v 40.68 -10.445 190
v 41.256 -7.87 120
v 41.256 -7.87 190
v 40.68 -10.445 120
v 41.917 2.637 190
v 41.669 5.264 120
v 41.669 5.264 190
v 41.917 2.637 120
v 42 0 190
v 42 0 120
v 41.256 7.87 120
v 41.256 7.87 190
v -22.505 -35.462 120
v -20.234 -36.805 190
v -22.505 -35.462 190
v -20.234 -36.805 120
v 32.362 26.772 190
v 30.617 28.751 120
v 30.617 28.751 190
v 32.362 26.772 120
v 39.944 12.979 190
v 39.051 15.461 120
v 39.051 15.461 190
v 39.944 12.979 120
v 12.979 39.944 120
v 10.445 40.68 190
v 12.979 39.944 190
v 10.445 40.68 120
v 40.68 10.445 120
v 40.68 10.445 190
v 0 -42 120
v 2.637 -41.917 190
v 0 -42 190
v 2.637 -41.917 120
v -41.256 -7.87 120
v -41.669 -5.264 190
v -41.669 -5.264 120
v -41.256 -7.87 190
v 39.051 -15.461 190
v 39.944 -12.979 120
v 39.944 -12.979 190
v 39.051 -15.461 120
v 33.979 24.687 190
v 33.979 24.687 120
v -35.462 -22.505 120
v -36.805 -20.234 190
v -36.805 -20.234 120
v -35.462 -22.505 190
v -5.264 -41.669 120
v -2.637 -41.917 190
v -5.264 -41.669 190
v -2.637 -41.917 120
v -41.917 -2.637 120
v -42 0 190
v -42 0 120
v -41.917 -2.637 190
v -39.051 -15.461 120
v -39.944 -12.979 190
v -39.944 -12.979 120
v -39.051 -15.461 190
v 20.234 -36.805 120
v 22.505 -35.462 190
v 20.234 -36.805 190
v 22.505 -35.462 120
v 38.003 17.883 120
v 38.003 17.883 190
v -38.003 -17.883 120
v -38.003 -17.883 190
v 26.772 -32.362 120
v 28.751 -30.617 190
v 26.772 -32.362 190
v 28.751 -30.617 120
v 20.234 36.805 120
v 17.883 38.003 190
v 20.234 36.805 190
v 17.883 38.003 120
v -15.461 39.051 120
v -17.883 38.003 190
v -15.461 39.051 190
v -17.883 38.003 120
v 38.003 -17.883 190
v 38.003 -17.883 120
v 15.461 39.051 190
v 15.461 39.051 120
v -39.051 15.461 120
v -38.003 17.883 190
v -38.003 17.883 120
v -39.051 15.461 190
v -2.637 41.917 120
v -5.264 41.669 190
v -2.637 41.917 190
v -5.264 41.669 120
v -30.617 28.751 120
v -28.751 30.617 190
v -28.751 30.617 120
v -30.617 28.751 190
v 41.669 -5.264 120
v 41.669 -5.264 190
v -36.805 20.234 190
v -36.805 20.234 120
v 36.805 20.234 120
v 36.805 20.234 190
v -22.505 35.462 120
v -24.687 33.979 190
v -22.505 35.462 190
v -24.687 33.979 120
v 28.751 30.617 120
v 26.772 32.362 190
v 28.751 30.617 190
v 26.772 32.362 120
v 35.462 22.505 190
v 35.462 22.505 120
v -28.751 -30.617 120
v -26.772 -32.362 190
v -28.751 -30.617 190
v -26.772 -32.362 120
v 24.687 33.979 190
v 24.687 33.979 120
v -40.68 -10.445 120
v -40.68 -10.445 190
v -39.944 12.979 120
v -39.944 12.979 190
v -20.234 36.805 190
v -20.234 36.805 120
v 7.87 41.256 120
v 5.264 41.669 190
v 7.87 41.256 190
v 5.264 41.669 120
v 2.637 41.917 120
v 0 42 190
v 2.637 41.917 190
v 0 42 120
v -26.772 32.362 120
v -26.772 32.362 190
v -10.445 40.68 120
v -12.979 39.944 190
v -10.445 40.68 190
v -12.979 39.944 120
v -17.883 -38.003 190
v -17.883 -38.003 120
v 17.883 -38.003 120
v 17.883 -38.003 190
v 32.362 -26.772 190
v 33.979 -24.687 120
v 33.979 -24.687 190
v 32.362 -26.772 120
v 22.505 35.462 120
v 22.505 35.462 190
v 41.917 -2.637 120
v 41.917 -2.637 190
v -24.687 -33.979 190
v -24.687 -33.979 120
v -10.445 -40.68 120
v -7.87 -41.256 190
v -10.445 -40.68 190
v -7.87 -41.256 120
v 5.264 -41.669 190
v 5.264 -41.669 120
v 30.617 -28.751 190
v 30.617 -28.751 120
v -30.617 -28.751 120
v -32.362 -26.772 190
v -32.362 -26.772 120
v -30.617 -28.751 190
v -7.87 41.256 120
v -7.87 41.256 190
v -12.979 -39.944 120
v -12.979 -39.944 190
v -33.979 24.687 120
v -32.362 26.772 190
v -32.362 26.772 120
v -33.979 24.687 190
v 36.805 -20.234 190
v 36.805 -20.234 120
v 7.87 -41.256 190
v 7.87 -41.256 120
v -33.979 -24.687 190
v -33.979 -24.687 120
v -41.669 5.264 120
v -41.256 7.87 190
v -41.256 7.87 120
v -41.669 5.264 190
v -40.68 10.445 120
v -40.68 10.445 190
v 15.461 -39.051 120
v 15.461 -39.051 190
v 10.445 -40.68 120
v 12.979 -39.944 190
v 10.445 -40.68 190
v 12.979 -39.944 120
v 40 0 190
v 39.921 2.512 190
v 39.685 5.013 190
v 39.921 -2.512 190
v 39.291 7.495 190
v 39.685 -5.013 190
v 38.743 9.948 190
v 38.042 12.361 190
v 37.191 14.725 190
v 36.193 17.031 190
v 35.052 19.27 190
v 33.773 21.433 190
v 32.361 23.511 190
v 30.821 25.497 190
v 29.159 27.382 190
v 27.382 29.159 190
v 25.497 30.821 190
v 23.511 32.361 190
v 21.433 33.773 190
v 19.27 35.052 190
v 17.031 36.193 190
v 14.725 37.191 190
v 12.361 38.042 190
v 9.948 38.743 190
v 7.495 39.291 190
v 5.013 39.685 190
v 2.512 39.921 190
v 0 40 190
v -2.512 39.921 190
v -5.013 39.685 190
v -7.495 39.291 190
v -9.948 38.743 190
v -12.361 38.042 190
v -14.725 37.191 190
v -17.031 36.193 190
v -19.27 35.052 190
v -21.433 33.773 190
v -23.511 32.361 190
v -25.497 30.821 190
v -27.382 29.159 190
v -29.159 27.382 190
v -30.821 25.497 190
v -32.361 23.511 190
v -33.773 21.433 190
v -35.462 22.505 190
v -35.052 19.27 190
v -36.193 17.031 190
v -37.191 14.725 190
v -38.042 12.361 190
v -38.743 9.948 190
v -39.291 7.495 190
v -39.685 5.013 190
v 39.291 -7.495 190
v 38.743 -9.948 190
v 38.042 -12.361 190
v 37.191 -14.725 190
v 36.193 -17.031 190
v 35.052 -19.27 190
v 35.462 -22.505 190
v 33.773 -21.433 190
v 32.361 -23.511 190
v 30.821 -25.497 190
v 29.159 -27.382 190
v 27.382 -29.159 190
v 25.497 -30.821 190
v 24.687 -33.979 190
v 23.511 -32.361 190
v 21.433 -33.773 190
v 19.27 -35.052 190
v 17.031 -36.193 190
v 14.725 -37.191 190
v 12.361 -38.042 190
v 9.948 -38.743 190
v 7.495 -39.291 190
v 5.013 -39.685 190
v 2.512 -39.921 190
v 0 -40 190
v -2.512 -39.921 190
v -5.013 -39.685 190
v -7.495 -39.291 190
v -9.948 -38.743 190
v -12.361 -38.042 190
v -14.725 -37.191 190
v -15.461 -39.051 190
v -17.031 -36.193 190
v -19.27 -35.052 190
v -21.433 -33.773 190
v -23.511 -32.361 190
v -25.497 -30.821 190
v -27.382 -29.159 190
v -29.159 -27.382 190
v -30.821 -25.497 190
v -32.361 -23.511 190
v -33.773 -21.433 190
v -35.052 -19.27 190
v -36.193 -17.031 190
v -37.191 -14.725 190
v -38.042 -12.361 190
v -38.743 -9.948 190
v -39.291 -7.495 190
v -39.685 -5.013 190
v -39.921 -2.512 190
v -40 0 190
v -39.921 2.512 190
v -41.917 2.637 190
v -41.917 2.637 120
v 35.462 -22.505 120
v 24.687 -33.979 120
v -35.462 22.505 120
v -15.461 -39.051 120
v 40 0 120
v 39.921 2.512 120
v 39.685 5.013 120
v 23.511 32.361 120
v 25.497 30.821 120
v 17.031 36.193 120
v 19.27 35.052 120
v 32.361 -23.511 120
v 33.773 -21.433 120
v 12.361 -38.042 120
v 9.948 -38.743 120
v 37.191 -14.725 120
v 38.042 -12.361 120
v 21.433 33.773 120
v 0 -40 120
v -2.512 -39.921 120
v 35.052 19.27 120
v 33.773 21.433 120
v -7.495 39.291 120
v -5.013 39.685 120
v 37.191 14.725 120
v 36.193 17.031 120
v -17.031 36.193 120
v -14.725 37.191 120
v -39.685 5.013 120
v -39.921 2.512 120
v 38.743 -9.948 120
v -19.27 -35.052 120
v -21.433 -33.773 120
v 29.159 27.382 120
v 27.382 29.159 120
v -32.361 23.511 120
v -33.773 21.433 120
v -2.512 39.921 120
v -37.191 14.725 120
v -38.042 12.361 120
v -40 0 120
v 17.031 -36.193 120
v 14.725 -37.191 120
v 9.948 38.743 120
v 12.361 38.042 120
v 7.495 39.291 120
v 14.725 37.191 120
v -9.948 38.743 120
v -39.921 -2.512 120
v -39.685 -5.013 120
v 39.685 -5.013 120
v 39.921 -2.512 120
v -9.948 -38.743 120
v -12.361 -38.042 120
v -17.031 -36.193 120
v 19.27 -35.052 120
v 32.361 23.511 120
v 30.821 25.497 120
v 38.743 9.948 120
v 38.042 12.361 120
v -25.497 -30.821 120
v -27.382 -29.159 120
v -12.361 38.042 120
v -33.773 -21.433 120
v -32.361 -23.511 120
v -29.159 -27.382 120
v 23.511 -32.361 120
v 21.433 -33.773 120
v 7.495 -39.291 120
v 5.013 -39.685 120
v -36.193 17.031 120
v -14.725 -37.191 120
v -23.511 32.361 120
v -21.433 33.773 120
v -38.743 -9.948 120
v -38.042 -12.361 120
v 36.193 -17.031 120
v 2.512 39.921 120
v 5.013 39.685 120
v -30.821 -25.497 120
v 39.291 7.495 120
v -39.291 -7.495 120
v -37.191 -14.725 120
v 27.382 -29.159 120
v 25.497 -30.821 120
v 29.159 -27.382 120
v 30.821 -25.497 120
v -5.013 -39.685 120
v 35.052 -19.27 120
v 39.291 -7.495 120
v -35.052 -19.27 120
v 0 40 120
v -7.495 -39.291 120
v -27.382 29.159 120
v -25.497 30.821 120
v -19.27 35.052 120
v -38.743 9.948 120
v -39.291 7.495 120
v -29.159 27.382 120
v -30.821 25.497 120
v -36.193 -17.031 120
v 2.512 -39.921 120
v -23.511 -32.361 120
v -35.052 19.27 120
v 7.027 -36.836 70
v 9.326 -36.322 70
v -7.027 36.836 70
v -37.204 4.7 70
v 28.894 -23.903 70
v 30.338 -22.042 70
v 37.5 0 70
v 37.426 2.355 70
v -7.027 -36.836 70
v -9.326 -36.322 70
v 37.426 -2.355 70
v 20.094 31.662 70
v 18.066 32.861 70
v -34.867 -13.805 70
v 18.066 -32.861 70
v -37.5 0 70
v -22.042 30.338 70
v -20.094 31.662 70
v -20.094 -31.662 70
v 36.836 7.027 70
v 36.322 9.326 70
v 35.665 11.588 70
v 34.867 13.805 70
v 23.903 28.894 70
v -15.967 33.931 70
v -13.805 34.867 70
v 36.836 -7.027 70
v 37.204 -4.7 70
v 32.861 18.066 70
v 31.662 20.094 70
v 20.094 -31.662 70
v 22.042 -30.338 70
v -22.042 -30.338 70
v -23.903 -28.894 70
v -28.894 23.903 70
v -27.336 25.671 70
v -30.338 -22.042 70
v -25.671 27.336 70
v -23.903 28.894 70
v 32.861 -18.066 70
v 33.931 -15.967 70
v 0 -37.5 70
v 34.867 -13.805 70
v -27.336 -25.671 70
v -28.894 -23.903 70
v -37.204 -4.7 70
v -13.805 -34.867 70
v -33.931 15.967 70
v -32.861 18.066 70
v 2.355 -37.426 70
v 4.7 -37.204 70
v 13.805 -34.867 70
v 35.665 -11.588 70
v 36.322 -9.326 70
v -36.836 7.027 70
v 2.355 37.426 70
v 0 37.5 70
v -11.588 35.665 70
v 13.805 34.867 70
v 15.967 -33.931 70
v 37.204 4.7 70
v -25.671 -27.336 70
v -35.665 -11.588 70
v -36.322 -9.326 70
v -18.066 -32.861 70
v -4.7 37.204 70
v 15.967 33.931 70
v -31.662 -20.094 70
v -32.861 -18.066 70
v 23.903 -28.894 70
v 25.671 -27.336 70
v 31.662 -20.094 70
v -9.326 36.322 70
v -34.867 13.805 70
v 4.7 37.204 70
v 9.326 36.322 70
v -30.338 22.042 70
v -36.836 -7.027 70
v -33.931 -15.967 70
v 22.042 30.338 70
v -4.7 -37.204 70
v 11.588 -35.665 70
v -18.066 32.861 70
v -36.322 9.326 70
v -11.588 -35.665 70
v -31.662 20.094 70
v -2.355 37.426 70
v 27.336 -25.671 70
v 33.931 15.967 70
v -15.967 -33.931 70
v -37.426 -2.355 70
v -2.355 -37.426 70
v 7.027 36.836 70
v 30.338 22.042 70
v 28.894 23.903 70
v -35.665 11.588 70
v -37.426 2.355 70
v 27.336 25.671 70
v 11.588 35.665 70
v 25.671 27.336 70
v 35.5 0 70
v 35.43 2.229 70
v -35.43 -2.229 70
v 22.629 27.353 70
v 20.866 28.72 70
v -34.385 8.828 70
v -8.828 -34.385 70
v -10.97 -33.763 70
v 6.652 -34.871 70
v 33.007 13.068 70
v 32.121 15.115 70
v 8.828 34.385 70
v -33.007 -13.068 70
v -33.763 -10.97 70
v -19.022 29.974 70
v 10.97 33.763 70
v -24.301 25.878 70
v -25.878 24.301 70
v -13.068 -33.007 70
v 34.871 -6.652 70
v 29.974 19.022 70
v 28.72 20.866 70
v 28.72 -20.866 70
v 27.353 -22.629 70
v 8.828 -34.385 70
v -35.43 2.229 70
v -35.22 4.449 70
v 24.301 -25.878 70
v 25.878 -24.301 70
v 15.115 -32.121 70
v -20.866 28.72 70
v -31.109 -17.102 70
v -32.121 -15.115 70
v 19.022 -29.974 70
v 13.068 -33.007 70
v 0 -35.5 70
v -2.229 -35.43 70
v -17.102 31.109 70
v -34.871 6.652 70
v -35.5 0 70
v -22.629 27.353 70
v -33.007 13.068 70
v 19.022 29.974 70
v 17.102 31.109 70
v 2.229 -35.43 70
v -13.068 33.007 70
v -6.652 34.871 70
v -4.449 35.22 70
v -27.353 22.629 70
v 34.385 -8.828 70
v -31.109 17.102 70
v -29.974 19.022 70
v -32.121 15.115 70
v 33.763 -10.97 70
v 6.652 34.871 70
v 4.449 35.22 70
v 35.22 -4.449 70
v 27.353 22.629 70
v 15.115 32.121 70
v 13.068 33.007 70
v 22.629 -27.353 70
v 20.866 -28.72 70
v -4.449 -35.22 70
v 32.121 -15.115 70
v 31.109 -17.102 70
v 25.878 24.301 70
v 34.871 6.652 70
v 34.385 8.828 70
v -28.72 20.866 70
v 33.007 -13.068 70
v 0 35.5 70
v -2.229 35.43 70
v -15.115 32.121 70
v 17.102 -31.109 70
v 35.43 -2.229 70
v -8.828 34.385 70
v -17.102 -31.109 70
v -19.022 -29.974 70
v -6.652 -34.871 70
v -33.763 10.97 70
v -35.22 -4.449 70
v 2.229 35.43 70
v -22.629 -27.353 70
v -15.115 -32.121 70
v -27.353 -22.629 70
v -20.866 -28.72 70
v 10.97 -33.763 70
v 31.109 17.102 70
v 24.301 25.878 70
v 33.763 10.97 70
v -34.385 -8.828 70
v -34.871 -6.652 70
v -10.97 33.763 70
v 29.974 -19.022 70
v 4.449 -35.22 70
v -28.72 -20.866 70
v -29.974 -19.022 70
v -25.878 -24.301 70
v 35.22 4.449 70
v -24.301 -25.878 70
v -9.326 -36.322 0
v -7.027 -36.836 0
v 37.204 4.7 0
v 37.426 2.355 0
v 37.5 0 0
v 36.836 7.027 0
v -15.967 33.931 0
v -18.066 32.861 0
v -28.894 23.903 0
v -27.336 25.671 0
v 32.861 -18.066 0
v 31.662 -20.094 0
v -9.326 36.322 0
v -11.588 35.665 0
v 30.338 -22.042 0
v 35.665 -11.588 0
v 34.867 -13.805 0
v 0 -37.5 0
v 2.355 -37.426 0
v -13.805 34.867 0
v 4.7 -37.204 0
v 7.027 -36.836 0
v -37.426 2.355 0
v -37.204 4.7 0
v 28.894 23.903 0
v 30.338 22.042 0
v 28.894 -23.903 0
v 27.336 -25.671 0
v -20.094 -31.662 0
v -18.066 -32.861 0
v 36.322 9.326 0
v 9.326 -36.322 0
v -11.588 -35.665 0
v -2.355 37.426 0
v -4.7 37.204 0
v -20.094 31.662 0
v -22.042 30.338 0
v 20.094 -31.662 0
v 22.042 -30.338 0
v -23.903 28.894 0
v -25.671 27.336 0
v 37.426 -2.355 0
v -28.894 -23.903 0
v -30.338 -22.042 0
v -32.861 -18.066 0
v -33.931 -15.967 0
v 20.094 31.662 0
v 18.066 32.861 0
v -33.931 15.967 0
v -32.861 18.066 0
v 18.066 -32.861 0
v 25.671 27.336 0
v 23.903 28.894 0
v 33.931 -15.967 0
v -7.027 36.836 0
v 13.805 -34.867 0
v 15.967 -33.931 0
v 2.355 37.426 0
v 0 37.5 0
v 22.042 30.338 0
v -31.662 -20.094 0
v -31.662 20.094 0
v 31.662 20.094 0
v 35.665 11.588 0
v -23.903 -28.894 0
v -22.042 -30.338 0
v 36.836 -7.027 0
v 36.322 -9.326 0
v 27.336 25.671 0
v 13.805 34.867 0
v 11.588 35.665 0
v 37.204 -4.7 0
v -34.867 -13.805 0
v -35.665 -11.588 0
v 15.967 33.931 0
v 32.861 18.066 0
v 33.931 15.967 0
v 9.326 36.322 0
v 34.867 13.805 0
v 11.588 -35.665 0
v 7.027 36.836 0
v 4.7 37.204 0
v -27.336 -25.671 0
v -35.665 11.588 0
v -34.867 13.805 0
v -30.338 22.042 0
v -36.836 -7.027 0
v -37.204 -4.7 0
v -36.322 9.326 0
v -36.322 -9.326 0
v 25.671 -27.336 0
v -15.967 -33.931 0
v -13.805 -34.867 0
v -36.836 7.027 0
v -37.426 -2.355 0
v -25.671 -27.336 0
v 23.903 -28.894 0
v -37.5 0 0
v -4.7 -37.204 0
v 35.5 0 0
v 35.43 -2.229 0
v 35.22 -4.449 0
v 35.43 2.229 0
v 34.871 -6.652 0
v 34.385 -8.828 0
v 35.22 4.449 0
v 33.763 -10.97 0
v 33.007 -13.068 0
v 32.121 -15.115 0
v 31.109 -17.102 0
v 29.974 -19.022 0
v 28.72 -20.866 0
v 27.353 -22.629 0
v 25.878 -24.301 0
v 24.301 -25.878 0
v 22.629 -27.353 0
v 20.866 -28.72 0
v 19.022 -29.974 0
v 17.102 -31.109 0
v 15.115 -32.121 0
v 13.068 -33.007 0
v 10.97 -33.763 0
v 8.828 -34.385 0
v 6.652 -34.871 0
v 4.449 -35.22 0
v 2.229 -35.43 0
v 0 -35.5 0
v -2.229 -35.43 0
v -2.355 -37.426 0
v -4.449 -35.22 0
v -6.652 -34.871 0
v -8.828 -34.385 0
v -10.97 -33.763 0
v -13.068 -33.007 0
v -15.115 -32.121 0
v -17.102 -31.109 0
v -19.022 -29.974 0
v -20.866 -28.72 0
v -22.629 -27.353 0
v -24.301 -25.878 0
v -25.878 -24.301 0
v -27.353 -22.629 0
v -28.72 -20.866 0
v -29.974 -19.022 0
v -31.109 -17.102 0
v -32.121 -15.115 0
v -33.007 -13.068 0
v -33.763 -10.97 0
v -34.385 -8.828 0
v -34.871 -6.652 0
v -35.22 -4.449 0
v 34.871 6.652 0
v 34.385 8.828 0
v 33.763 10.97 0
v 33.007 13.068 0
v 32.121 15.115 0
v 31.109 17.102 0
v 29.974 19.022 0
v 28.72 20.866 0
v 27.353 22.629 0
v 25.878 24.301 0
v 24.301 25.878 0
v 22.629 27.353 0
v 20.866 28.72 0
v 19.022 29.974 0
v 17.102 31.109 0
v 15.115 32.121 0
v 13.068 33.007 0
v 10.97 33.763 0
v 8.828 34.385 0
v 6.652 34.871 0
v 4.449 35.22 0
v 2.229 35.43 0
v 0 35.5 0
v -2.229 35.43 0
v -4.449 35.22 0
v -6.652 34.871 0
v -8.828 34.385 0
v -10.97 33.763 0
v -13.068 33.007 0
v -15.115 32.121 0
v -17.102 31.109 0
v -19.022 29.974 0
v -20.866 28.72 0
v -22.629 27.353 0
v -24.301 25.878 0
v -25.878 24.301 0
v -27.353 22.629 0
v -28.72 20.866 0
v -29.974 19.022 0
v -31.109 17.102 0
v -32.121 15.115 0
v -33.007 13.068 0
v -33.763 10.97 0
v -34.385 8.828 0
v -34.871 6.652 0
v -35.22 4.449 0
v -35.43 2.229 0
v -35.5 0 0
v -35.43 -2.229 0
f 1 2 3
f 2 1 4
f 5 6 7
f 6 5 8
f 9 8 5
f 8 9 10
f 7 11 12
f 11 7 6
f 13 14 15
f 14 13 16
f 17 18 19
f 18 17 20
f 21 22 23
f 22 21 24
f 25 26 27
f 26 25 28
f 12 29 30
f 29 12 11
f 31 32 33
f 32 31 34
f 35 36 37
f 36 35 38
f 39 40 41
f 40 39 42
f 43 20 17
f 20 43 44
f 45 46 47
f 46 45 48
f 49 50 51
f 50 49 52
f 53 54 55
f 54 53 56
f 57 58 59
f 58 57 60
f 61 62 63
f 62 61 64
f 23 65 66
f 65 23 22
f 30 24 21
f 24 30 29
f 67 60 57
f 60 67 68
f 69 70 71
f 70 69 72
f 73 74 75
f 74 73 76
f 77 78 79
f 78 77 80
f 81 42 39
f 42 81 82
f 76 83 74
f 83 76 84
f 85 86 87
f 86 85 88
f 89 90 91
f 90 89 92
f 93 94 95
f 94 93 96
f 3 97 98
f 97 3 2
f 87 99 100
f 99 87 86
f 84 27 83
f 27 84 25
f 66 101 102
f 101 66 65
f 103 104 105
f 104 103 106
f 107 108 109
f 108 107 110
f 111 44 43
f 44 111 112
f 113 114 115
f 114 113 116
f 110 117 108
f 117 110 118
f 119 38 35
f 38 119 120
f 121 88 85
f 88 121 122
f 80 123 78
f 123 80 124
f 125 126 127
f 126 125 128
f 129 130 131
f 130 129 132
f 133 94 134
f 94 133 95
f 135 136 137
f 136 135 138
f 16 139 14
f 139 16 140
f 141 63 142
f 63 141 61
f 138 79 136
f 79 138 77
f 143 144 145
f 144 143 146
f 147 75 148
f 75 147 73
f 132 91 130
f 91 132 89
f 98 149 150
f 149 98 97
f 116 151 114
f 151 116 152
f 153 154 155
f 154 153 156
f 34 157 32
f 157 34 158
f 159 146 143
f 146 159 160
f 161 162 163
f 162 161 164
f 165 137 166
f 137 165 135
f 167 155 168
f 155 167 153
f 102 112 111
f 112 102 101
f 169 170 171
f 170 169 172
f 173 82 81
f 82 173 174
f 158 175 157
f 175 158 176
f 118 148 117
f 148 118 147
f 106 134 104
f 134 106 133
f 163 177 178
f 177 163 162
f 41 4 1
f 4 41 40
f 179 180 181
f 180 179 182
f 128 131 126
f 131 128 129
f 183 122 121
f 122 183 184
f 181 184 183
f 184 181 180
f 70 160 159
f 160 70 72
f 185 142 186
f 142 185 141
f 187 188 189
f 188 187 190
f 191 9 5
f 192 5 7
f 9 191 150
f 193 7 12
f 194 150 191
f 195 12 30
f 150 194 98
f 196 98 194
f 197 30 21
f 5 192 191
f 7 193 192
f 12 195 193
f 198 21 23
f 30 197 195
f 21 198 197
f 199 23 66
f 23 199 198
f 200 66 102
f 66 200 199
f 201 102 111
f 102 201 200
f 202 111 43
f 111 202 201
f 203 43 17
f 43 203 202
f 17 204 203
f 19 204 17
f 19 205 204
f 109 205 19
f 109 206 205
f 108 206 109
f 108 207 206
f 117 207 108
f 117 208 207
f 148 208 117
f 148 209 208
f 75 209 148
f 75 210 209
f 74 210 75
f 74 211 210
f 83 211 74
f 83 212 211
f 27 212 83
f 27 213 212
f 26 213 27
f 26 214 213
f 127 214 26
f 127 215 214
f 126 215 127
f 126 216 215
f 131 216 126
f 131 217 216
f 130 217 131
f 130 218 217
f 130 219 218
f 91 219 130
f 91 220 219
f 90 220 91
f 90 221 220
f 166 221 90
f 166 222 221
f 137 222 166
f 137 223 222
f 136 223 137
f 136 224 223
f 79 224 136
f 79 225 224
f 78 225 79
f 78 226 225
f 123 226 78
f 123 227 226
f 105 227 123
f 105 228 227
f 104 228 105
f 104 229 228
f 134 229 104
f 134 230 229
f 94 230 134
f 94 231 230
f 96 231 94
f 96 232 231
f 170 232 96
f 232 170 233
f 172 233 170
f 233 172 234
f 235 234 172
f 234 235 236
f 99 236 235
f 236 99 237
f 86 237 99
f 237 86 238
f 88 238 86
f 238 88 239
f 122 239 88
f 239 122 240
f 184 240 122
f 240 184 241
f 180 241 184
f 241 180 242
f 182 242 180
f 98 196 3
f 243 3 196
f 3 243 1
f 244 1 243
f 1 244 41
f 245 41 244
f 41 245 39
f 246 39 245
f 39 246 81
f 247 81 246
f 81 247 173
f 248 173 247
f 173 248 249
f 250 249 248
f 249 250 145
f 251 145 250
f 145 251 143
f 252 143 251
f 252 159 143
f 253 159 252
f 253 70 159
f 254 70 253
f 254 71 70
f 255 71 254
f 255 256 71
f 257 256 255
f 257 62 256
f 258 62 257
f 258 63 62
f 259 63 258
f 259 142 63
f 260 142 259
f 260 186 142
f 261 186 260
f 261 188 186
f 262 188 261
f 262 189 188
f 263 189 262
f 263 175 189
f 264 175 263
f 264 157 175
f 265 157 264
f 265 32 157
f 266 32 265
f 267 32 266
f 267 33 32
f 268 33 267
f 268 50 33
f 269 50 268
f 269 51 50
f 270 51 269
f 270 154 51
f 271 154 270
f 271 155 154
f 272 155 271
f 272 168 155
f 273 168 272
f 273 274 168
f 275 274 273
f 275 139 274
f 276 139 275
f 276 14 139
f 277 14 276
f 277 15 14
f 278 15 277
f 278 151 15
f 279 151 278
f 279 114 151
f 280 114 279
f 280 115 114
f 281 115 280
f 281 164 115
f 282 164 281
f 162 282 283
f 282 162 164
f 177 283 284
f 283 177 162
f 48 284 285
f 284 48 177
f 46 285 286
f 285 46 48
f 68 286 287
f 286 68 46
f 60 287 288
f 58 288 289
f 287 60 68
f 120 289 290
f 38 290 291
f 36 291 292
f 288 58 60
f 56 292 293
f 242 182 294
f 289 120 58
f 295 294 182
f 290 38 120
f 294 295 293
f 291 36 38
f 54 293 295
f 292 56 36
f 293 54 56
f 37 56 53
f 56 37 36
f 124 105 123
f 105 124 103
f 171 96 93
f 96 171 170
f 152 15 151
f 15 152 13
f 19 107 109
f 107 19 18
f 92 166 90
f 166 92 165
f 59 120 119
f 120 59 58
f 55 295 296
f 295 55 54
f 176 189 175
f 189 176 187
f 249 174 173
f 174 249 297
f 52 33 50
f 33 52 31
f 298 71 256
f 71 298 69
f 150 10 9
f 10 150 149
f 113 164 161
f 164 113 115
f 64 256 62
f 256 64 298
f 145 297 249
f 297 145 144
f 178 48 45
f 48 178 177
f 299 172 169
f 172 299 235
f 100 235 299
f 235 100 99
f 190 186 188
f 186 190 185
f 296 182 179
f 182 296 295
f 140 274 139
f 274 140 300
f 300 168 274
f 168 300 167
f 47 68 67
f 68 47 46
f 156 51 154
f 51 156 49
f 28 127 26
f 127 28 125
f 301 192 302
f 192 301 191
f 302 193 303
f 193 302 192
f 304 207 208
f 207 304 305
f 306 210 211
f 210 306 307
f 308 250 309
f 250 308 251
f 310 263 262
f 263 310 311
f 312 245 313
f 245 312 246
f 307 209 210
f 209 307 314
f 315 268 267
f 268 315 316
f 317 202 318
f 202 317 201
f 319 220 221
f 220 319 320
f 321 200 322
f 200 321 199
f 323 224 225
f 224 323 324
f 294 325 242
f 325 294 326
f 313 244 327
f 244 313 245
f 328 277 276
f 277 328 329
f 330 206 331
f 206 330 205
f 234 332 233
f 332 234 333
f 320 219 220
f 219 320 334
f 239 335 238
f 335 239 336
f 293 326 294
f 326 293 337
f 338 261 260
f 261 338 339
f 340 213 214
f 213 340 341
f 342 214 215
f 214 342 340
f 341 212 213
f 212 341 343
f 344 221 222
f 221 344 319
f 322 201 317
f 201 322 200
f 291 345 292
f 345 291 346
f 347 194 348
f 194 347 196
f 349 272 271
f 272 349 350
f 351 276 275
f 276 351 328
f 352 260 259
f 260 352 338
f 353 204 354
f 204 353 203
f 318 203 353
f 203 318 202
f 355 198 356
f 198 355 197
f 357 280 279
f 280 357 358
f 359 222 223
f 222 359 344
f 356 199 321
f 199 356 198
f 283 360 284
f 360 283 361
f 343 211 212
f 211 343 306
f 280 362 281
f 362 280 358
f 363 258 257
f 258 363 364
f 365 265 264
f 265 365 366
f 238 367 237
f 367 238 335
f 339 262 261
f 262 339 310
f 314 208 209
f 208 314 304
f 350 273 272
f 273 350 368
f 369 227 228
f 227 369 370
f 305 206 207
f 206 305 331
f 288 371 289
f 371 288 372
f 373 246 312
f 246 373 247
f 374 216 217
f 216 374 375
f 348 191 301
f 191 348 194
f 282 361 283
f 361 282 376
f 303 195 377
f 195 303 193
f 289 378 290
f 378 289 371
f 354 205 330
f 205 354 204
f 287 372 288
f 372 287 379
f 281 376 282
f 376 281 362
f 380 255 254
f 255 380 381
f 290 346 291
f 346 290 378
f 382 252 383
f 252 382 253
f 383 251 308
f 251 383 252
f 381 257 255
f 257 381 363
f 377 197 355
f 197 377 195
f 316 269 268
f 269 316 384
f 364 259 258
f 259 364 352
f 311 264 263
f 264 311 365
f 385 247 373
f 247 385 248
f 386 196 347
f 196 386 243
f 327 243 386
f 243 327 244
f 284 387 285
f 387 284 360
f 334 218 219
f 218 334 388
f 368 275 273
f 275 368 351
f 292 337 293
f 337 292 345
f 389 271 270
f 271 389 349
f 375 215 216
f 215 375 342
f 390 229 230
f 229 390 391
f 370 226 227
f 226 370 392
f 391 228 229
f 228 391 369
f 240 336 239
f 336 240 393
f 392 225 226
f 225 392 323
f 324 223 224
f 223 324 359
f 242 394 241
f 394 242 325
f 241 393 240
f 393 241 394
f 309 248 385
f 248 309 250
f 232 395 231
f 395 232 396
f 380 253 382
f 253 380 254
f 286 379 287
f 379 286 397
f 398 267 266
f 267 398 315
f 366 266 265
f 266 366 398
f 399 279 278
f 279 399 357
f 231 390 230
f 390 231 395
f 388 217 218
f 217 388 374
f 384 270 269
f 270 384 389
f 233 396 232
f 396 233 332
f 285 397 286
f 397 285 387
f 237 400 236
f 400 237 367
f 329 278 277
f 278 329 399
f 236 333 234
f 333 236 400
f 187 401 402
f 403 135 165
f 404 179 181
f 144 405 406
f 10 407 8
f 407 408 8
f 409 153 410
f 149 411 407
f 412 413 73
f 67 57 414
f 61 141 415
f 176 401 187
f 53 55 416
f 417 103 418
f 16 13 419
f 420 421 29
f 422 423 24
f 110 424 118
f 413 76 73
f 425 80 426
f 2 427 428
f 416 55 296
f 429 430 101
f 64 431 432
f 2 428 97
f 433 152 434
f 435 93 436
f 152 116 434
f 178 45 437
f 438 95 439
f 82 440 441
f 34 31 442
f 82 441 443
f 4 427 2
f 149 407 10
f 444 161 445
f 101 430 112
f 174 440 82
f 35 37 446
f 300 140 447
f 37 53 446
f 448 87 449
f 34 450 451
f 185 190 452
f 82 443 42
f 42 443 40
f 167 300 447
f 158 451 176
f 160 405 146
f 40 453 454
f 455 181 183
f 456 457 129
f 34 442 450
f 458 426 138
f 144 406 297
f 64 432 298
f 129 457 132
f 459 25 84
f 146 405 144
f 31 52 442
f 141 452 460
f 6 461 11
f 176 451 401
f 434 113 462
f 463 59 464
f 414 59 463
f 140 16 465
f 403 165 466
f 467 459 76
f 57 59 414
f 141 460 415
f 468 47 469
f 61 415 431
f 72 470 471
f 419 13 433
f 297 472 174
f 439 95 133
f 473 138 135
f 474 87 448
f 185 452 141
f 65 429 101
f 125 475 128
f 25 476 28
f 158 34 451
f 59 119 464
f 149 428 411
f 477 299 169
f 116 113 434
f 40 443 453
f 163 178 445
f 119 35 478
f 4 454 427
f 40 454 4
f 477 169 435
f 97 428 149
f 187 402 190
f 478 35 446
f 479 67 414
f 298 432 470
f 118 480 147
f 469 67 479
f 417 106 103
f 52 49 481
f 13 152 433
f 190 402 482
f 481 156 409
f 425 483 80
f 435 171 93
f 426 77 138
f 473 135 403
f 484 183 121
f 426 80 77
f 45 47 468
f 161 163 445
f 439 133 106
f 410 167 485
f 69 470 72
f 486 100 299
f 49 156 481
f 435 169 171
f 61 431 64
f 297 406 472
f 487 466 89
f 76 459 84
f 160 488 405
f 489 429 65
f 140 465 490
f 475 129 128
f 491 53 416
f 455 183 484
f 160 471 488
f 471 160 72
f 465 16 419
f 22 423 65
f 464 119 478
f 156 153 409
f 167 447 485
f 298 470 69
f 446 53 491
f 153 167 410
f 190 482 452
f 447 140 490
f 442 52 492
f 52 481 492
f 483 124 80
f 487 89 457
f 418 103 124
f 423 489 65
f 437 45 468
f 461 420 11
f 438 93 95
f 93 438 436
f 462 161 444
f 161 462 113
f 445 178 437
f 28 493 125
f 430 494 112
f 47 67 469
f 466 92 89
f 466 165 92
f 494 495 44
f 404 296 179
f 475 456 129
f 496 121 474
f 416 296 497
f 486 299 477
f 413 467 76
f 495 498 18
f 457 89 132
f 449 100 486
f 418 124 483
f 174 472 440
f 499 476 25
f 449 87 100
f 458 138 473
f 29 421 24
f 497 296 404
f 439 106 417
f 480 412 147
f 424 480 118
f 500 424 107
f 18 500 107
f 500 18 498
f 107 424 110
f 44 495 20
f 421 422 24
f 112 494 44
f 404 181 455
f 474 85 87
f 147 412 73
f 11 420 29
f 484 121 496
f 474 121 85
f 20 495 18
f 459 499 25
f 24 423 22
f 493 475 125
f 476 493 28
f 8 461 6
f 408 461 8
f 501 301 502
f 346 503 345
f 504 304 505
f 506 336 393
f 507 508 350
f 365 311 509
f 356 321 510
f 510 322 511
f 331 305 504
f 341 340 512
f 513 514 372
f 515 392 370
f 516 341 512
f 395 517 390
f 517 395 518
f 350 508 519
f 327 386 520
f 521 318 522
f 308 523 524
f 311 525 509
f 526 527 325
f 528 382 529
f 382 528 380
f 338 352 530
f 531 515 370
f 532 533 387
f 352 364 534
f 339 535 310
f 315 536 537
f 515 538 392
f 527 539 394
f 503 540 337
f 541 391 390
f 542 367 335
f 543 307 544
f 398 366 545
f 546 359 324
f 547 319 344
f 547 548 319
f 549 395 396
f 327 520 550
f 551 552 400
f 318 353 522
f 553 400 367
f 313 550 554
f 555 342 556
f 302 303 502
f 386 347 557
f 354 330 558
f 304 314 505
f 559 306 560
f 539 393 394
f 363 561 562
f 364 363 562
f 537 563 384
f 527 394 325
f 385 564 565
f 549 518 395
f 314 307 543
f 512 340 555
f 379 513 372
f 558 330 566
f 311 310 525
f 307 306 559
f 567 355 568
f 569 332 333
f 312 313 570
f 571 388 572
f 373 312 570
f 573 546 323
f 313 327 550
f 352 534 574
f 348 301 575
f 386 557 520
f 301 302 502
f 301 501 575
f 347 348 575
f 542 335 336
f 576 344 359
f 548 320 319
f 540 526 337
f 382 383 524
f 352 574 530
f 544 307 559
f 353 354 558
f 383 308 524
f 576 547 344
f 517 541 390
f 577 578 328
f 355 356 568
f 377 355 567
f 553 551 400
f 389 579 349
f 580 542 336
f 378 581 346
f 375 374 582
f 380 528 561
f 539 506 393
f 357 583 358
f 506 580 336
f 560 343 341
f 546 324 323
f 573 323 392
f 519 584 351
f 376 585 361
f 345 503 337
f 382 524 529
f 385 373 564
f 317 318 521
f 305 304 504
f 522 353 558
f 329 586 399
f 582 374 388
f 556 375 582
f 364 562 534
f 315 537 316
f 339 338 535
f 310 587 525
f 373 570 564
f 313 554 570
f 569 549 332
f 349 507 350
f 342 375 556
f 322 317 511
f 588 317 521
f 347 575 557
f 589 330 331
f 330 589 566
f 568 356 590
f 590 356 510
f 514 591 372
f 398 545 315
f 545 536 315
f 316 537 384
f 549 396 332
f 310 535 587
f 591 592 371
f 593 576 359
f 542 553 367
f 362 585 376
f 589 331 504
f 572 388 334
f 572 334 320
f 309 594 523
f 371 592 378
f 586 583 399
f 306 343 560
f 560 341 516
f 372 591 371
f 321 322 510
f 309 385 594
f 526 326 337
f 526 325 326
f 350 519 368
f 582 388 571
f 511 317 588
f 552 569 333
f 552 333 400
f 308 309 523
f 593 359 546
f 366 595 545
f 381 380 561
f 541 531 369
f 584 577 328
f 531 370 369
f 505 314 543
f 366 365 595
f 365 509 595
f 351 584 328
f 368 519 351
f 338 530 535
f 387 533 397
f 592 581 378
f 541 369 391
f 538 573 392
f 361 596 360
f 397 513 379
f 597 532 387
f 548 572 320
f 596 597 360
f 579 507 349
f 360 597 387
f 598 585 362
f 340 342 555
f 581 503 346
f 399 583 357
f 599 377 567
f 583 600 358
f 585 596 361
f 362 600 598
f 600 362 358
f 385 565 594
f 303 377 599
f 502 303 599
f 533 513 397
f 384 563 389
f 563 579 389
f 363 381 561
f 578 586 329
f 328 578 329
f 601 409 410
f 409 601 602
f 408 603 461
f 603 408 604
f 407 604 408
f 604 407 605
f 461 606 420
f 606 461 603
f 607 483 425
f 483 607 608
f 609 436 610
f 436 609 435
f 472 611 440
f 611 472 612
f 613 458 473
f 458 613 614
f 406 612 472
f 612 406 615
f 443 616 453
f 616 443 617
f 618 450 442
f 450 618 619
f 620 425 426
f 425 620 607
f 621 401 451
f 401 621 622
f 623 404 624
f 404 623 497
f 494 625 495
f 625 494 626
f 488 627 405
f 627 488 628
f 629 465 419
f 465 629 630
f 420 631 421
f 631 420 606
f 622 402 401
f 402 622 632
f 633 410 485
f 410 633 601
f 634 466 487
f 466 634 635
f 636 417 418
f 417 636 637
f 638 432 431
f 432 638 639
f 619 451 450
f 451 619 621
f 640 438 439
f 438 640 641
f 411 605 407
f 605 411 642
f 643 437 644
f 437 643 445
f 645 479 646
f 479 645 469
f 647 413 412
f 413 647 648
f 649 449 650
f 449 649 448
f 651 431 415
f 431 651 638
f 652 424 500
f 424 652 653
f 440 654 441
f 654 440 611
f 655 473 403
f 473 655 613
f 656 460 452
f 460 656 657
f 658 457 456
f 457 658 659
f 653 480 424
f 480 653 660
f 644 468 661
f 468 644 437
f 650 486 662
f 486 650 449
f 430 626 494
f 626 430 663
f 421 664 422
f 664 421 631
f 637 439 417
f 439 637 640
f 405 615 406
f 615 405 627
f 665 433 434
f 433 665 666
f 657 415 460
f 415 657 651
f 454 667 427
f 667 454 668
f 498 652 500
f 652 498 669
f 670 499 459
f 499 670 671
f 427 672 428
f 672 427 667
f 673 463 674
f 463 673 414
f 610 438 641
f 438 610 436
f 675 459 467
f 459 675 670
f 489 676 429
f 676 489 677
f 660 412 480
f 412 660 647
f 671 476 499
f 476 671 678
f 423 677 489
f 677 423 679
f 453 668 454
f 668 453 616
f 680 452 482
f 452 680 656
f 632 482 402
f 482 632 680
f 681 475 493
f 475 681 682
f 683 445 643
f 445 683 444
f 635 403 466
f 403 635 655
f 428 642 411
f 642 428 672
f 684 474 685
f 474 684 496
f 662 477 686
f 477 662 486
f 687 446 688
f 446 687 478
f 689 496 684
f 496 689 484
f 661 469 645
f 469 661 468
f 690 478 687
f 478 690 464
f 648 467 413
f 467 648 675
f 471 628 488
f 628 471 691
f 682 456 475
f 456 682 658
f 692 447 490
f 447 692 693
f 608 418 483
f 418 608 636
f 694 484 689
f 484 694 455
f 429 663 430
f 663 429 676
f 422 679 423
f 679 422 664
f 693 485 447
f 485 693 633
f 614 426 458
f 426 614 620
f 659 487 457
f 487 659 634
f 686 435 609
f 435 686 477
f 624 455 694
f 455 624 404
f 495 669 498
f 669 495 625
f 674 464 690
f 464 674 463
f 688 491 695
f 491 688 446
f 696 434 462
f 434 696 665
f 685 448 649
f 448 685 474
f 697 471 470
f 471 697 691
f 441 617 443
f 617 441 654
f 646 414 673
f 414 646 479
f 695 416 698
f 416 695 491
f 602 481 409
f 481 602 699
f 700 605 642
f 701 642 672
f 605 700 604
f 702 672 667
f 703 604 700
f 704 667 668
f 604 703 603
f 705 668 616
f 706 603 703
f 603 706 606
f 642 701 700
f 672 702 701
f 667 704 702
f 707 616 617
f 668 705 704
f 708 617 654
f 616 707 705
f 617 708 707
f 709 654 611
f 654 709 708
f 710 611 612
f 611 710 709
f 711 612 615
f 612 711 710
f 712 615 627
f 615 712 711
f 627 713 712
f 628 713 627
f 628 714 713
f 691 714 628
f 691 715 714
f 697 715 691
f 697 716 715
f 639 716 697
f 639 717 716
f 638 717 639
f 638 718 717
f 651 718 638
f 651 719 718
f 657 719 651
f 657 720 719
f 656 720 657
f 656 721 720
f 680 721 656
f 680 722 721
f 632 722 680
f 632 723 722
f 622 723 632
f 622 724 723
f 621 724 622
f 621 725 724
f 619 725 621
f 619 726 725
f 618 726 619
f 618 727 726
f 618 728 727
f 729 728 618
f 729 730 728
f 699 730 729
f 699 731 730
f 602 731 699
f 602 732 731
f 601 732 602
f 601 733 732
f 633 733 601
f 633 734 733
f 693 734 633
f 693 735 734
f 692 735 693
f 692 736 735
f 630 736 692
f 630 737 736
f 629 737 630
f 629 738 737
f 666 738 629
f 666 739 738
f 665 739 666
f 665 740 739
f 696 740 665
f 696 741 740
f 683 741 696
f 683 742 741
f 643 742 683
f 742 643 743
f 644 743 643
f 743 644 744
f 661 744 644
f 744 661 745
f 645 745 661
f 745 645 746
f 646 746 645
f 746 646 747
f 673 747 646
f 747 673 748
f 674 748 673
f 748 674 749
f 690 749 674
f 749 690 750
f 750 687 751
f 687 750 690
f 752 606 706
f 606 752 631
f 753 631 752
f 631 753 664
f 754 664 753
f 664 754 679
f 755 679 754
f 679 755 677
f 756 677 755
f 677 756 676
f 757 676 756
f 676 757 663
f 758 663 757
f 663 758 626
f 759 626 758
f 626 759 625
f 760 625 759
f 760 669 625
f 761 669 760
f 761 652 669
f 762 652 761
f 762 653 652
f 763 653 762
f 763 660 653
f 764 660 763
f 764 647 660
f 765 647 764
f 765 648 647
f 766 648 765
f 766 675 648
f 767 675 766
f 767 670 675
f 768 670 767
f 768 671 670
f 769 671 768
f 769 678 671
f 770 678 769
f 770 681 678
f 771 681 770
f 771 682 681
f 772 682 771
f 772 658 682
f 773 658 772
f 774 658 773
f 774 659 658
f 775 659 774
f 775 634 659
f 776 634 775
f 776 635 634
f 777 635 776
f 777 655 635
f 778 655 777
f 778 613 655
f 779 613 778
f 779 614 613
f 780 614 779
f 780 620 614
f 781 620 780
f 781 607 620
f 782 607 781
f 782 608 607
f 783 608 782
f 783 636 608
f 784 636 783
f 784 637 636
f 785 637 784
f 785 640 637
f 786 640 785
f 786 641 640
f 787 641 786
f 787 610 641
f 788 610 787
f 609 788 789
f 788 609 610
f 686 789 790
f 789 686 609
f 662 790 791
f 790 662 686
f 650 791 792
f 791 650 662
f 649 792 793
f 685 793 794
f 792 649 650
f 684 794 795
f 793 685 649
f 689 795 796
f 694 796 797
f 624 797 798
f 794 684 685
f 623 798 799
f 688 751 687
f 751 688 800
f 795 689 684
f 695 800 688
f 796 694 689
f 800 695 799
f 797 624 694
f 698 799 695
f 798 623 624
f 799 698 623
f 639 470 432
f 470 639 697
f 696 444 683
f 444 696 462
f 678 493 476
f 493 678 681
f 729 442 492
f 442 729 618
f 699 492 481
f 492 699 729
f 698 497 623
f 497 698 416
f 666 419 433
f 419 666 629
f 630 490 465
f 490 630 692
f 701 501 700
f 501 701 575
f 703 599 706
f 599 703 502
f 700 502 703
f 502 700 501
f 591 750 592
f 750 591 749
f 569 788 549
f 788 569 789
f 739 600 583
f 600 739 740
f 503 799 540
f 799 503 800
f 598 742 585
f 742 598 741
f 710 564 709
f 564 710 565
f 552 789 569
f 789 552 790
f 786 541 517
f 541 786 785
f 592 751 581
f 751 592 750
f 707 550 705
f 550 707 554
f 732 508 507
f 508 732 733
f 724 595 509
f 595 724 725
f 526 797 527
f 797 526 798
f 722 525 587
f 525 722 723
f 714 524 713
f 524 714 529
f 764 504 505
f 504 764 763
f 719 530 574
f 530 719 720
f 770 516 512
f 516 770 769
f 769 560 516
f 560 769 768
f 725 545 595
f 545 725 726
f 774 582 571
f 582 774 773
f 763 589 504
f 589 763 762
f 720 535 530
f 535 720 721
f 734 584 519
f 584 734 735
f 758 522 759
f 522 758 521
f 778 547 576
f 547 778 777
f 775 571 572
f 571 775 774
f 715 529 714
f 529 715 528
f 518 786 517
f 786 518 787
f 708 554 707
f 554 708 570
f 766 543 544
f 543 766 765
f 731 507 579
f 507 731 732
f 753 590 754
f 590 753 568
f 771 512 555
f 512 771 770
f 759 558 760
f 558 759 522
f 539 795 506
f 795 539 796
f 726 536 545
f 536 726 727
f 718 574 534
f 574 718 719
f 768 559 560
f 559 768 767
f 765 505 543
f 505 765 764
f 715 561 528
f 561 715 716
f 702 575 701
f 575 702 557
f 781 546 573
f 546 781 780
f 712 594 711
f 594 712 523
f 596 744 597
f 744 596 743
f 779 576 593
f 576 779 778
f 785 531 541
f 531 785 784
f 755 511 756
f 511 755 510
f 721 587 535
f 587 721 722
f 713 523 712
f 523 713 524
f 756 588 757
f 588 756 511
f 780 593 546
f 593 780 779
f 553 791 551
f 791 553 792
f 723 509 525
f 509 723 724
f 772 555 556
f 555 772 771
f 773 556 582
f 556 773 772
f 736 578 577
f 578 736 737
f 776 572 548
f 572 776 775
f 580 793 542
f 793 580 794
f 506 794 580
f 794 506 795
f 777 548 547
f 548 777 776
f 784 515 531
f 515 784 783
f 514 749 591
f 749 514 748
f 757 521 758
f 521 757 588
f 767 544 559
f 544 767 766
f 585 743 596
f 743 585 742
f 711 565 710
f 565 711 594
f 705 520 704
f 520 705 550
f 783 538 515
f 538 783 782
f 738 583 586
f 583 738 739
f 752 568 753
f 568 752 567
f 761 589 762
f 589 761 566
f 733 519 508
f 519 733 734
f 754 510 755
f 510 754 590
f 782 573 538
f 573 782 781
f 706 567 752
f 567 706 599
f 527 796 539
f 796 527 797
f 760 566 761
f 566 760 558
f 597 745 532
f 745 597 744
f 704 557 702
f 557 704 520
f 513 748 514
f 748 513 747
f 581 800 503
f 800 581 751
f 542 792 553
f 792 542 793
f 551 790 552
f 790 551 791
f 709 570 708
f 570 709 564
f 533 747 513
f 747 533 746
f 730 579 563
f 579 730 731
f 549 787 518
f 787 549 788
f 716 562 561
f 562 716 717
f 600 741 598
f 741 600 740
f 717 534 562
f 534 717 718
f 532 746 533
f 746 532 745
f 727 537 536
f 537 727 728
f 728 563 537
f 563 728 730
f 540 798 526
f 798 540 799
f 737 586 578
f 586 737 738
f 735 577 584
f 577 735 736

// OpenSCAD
/* Pipe reducer fitting, good for HAVC, gutters and other low pressure applications.
   The upper part is defined by its INNER diameter because a pipe is supposed to be placed into it. The lower part is defined by its OUTER diameter because it's supposed to go into another pipe.
   There's no room for the gasket so make sure to leave a millimeter or two for silicone

  */
  
/* Redukcja rury, powinna dać się zastosować do wentylacji czy rynien gdzie ciśnienie jest niewielkie.
   Górna część redukcji jest opisana przez średnicę wewnętrzną ponieważ wchodzi do niej inna rura. Dolna część jest opisana przez średnicę zewnętrzną, ponieważ wchodzi do innej rury.
   Nie jest przewidziane miejsce na uszczelkę więc dobrze jest zostawić w górnej części milimetr albo dwa luzu na silikon.
  */
   

/* The inner diameter of the top part */
ID = 80;
IR = ID/2;
/* Length of the top part */
larger_length = 70;

/* The outer diameter of the lower part */
OD = 75;
OR = OD / 2;
/* Length of the bottom part */
smaller_length = 70;

/* Length of the middle part */
reduction_length = 50;
/* Thickness of the pipe wall */
thickness = 2;

module larger() {
    difference() {
        cylinder(r=IR+thickness, h=larger_length, $fn=100);
        cylinder(r=IR, h=larger_length, $fn=100);
    }
}

module reduction() {
    difference() {
        cylinder(r1=OR, r2=IR+thickness, h=reduction_length, $fn=100);
        cylinder(r1=OR-thickness, r2=IR, h=reduction_length, $fn=100);
    }
}

module smaller() {
    difference() {
        cylinder(r=OR, h=smaller_length, $fn=100);
        cylinder(r=OR-thickness, h=smaller_length, $fn=100);
    }
}

translate([0,0,reduction_length+smaller_length]) larger();
translate([0,0,smaller_length]) reduction();
smaller();
